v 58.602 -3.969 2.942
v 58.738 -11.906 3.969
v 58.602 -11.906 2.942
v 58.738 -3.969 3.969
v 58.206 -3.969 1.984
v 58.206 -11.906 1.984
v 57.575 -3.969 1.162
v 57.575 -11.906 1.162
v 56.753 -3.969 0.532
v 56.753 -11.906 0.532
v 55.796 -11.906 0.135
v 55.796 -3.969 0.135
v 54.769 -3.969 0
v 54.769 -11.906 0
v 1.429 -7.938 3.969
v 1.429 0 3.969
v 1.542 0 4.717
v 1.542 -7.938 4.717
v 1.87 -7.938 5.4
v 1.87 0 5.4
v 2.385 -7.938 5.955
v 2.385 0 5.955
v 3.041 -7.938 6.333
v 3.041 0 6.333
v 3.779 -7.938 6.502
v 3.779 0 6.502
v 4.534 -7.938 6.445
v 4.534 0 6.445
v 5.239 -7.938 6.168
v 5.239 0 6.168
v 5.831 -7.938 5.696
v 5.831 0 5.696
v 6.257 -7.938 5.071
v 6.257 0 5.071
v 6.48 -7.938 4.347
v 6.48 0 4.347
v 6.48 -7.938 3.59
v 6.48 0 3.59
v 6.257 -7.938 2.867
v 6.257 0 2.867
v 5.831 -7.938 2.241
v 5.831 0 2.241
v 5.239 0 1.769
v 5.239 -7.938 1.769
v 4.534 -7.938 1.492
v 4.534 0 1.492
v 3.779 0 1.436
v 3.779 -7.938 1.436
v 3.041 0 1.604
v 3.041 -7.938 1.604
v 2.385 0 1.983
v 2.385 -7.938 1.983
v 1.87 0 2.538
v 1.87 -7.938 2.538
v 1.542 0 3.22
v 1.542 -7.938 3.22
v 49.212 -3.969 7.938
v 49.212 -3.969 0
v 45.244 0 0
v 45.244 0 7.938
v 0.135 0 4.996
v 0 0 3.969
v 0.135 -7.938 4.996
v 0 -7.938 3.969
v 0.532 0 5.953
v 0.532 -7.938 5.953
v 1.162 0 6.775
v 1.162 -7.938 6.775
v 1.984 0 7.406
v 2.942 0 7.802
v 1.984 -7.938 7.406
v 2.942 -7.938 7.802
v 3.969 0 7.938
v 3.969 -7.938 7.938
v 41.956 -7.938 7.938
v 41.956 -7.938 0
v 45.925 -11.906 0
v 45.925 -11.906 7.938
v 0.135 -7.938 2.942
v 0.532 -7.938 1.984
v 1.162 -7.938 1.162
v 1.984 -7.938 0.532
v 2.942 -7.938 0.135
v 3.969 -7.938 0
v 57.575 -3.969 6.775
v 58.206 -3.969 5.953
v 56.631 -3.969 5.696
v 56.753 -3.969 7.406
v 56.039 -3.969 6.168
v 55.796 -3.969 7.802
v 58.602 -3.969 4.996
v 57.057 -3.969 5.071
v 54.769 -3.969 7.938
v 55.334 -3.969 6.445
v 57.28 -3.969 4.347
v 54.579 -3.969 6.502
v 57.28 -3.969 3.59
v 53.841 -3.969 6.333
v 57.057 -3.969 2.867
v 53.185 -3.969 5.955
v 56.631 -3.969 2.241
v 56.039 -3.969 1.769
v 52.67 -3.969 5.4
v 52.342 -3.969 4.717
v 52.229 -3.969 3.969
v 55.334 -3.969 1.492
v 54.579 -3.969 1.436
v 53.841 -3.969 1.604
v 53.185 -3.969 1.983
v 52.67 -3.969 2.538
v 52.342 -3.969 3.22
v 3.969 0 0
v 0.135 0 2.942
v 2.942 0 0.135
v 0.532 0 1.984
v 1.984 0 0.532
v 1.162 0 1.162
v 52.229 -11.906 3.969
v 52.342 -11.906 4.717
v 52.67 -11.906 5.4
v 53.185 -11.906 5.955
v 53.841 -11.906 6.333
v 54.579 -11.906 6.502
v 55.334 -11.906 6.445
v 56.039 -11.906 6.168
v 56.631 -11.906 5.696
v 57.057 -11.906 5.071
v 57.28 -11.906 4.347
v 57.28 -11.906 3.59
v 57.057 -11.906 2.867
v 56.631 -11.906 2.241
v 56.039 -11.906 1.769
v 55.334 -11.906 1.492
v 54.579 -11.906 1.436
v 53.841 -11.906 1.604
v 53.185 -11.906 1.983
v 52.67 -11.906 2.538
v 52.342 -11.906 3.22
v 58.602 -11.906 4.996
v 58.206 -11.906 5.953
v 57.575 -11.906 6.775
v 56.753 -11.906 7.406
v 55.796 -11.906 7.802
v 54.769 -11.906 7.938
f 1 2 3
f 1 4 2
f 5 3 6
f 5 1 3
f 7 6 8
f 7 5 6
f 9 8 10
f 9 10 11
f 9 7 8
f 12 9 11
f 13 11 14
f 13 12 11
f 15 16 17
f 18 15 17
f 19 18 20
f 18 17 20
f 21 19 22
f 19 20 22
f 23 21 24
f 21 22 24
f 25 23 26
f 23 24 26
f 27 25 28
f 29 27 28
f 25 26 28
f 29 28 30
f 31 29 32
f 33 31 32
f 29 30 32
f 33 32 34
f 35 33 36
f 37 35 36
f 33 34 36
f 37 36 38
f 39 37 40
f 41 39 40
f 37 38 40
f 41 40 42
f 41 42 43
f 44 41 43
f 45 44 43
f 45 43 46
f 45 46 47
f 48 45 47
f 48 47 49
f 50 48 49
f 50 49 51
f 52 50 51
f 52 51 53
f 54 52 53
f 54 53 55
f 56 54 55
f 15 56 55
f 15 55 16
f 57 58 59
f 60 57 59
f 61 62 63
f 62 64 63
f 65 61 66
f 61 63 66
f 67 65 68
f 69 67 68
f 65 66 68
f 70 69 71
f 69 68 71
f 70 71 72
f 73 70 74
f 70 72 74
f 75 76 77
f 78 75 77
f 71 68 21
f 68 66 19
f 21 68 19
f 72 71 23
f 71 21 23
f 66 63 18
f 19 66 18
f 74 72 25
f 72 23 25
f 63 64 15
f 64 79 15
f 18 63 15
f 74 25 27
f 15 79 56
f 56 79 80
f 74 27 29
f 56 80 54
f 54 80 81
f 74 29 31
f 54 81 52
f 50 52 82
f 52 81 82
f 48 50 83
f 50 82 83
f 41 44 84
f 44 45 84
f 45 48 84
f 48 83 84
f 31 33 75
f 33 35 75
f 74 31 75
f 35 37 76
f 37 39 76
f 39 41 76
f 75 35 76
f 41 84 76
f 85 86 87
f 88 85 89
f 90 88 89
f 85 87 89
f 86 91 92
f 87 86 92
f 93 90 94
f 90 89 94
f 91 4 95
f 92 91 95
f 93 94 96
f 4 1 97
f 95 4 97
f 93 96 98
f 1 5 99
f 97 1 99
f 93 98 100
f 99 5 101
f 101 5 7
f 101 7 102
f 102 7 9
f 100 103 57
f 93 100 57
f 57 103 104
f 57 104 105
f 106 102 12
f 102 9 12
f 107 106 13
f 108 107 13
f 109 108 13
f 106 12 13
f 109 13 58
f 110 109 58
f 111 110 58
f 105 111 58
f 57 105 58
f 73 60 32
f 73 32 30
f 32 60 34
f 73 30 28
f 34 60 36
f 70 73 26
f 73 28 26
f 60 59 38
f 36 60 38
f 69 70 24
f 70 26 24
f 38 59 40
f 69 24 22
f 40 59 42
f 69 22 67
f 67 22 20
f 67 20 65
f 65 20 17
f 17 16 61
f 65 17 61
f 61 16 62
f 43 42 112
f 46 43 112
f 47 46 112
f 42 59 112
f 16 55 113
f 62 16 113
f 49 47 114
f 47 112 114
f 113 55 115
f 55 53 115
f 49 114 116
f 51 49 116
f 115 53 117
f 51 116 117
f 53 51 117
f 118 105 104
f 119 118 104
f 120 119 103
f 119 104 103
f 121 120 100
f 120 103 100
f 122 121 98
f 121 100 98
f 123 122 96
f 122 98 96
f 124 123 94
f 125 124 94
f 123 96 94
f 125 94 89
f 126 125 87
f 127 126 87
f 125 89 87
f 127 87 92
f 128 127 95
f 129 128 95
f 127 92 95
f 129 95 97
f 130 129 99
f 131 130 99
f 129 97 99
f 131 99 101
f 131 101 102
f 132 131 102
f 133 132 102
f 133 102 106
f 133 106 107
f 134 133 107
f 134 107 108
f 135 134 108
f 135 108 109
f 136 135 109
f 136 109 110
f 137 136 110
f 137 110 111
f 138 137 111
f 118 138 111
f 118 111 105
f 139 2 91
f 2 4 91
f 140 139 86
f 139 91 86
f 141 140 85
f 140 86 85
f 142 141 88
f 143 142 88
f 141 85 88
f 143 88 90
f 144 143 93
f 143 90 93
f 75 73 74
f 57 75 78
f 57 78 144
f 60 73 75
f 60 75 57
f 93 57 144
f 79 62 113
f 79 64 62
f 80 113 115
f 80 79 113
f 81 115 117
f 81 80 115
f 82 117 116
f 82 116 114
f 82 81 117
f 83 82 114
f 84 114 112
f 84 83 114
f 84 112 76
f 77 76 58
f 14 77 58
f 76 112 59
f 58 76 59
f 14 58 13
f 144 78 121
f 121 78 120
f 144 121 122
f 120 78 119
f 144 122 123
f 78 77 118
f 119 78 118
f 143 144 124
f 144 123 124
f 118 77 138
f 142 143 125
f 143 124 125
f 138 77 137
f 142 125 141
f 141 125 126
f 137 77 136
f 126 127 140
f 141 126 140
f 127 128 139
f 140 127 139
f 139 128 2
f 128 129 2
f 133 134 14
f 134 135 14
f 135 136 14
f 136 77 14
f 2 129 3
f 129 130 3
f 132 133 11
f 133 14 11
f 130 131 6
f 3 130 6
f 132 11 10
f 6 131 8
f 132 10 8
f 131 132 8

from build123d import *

# Parameters (mm, degrees)
F1_DEPTH = 7.9375
F2_R     = 3.96874
F3_R     = 2.54
F4_DEPTH = 11.90625


# Not quite as in the source:
# - a fillet or chamfer is up to 0.001 mm smaller than in the source, because OpenCascade refuses the exact size


with BuildPart() as f1:
    # F0 (on Top) → F1 (new body)
    with BuildSketch(Plane.XY):
        Polygon((45.24375, 0), (0, 0), (0, -7.9375), (41.9559298487, -7.9375), (45.9246798487, -11.90625), (58.7375, -11.90625), (58.7375, -3.96875), (49.2125, -3.96875), align=None)
    extrude(amount=F1_DEPTH)

    # F2 (radius 3.96875 in the source; OpenCascade refuses exactly that, so slightly less here)
    f2_edges = [f1.edges().sort_by_distance(p)[0] for p in [
        (0, -3.96875, 0),
        (0, -3.96875, 7.9375),
        (58.7375, -7.9375, 0),
        (58.7375, -7.9375, 7.9375),
    ]]
    fillet(f2_edges, radius=F2_R)

    # F3 (on face) → F4 (cut, through all)
    with BuildSketch(Plane(origin=(0, 0, 0), x_dir=(-1, 0, 0), z_dir=(0, 1, 0))):
        with Locations((-3.96875, 3.96875)):
            Circle(F3_R)
        with Locations((-54.76875, 3.96875)):
            Circle(F3_R)
    extrude(amount=-F4_DEPTH, mode=Mode.SUBTRACT)


solid = f1.part
